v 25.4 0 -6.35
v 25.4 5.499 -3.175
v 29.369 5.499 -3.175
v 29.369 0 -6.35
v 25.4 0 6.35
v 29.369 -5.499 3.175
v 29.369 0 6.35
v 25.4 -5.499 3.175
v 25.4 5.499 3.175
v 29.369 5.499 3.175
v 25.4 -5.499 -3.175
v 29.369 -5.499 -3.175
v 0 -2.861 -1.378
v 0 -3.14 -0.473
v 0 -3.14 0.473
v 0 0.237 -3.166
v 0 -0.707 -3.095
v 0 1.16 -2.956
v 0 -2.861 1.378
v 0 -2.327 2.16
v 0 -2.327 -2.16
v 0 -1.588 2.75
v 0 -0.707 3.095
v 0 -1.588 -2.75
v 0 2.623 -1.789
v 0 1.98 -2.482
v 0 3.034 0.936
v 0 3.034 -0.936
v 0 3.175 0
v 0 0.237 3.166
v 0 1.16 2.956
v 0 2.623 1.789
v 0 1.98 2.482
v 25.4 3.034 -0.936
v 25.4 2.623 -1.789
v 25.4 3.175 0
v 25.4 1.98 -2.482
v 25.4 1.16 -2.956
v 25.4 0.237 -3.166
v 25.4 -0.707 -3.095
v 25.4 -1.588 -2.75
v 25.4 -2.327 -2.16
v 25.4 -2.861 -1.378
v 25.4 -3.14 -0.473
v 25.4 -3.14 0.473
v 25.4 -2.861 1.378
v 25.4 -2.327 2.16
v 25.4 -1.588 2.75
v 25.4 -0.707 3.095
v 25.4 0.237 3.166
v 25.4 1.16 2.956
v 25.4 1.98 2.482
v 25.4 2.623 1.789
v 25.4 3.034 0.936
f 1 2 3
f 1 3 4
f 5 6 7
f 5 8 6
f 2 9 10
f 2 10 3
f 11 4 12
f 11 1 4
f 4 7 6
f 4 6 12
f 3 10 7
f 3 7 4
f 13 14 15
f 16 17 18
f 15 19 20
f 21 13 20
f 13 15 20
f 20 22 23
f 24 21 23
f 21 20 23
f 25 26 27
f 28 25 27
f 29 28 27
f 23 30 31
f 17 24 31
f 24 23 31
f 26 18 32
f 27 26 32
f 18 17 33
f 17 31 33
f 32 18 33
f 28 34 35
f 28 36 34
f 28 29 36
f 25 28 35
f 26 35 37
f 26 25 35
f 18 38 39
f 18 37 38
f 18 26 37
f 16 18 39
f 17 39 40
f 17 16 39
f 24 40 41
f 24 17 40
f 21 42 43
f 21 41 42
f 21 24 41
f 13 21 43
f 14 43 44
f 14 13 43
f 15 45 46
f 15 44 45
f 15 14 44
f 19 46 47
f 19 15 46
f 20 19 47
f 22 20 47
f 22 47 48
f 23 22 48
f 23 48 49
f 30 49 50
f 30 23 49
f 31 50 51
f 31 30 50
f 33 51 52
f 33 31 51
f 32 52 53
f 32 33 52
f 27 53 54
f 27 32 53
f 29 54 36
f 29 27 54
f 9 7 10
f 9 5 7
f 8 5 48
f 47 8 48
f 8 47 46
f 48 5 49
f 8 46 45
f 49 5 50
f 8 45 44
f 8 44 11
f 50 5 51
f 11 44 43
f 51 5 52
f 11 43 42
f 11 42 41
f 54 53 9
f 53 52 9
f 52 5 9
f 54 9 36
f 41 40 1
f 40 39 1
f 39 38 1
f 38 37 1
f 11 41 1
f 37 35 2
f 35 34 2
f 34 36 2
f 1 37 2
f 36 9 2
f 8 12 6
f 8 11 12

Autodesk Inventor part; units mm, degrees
ref_plane "YZ Plane" through (0, 0, 0) normal (1, 0, 0) x (0, 1, 0)
ref_plane "XZ Plane" through (0, 0, 0) normal (0, 1, 0) x (-1, 0, 0)
ref_plane "XY Plane" through (0, 0, 0) normal (0, 0, 1) x (1, 0, 0)
sketch "Sketch1" plane through (0, 0, 0) normal (1, 0, 0) x (0, 1, 0)
  circle A0 centre (0, 0) radius 3.175
  dimension "d0" = 6.35
extrude "Extrusion1" add sketch "Sketch1" along normal blind 25.4
thread "Thread1" size "1/4-20 UNC" class "2A" standard "ANSI Unified Screw Threads" full length
sketch "Sketch2" plane through (25.4, 0, 0) normal (1, 0, 0) x (0, 0, -1)
  circle A0 centre (0, 0) radius 6.35
  line L0 (6.35, 0) -> (3.175, -5.4993)
  line L1 (3.175, -5.4993) -> (-3.175, -5.4993)
  line L2 (-3.175, -5.4993) -> (-6.35, 0)
  line L3 (-6.35, 0) -> (-3.175, 5.4993)
  line L4 (-3.175, 5.4993) -> (3.175, 5.4993)
  line L5 (3.175, 5.4993) -> (6.35, 0)
  dimension "d5" = 12.7
extrude "Extrusion2" add sketch "Sketch2" along normal blind 3.9688 contours L0 L1 L2 L3 L4 L5
properties part number "bolt"
